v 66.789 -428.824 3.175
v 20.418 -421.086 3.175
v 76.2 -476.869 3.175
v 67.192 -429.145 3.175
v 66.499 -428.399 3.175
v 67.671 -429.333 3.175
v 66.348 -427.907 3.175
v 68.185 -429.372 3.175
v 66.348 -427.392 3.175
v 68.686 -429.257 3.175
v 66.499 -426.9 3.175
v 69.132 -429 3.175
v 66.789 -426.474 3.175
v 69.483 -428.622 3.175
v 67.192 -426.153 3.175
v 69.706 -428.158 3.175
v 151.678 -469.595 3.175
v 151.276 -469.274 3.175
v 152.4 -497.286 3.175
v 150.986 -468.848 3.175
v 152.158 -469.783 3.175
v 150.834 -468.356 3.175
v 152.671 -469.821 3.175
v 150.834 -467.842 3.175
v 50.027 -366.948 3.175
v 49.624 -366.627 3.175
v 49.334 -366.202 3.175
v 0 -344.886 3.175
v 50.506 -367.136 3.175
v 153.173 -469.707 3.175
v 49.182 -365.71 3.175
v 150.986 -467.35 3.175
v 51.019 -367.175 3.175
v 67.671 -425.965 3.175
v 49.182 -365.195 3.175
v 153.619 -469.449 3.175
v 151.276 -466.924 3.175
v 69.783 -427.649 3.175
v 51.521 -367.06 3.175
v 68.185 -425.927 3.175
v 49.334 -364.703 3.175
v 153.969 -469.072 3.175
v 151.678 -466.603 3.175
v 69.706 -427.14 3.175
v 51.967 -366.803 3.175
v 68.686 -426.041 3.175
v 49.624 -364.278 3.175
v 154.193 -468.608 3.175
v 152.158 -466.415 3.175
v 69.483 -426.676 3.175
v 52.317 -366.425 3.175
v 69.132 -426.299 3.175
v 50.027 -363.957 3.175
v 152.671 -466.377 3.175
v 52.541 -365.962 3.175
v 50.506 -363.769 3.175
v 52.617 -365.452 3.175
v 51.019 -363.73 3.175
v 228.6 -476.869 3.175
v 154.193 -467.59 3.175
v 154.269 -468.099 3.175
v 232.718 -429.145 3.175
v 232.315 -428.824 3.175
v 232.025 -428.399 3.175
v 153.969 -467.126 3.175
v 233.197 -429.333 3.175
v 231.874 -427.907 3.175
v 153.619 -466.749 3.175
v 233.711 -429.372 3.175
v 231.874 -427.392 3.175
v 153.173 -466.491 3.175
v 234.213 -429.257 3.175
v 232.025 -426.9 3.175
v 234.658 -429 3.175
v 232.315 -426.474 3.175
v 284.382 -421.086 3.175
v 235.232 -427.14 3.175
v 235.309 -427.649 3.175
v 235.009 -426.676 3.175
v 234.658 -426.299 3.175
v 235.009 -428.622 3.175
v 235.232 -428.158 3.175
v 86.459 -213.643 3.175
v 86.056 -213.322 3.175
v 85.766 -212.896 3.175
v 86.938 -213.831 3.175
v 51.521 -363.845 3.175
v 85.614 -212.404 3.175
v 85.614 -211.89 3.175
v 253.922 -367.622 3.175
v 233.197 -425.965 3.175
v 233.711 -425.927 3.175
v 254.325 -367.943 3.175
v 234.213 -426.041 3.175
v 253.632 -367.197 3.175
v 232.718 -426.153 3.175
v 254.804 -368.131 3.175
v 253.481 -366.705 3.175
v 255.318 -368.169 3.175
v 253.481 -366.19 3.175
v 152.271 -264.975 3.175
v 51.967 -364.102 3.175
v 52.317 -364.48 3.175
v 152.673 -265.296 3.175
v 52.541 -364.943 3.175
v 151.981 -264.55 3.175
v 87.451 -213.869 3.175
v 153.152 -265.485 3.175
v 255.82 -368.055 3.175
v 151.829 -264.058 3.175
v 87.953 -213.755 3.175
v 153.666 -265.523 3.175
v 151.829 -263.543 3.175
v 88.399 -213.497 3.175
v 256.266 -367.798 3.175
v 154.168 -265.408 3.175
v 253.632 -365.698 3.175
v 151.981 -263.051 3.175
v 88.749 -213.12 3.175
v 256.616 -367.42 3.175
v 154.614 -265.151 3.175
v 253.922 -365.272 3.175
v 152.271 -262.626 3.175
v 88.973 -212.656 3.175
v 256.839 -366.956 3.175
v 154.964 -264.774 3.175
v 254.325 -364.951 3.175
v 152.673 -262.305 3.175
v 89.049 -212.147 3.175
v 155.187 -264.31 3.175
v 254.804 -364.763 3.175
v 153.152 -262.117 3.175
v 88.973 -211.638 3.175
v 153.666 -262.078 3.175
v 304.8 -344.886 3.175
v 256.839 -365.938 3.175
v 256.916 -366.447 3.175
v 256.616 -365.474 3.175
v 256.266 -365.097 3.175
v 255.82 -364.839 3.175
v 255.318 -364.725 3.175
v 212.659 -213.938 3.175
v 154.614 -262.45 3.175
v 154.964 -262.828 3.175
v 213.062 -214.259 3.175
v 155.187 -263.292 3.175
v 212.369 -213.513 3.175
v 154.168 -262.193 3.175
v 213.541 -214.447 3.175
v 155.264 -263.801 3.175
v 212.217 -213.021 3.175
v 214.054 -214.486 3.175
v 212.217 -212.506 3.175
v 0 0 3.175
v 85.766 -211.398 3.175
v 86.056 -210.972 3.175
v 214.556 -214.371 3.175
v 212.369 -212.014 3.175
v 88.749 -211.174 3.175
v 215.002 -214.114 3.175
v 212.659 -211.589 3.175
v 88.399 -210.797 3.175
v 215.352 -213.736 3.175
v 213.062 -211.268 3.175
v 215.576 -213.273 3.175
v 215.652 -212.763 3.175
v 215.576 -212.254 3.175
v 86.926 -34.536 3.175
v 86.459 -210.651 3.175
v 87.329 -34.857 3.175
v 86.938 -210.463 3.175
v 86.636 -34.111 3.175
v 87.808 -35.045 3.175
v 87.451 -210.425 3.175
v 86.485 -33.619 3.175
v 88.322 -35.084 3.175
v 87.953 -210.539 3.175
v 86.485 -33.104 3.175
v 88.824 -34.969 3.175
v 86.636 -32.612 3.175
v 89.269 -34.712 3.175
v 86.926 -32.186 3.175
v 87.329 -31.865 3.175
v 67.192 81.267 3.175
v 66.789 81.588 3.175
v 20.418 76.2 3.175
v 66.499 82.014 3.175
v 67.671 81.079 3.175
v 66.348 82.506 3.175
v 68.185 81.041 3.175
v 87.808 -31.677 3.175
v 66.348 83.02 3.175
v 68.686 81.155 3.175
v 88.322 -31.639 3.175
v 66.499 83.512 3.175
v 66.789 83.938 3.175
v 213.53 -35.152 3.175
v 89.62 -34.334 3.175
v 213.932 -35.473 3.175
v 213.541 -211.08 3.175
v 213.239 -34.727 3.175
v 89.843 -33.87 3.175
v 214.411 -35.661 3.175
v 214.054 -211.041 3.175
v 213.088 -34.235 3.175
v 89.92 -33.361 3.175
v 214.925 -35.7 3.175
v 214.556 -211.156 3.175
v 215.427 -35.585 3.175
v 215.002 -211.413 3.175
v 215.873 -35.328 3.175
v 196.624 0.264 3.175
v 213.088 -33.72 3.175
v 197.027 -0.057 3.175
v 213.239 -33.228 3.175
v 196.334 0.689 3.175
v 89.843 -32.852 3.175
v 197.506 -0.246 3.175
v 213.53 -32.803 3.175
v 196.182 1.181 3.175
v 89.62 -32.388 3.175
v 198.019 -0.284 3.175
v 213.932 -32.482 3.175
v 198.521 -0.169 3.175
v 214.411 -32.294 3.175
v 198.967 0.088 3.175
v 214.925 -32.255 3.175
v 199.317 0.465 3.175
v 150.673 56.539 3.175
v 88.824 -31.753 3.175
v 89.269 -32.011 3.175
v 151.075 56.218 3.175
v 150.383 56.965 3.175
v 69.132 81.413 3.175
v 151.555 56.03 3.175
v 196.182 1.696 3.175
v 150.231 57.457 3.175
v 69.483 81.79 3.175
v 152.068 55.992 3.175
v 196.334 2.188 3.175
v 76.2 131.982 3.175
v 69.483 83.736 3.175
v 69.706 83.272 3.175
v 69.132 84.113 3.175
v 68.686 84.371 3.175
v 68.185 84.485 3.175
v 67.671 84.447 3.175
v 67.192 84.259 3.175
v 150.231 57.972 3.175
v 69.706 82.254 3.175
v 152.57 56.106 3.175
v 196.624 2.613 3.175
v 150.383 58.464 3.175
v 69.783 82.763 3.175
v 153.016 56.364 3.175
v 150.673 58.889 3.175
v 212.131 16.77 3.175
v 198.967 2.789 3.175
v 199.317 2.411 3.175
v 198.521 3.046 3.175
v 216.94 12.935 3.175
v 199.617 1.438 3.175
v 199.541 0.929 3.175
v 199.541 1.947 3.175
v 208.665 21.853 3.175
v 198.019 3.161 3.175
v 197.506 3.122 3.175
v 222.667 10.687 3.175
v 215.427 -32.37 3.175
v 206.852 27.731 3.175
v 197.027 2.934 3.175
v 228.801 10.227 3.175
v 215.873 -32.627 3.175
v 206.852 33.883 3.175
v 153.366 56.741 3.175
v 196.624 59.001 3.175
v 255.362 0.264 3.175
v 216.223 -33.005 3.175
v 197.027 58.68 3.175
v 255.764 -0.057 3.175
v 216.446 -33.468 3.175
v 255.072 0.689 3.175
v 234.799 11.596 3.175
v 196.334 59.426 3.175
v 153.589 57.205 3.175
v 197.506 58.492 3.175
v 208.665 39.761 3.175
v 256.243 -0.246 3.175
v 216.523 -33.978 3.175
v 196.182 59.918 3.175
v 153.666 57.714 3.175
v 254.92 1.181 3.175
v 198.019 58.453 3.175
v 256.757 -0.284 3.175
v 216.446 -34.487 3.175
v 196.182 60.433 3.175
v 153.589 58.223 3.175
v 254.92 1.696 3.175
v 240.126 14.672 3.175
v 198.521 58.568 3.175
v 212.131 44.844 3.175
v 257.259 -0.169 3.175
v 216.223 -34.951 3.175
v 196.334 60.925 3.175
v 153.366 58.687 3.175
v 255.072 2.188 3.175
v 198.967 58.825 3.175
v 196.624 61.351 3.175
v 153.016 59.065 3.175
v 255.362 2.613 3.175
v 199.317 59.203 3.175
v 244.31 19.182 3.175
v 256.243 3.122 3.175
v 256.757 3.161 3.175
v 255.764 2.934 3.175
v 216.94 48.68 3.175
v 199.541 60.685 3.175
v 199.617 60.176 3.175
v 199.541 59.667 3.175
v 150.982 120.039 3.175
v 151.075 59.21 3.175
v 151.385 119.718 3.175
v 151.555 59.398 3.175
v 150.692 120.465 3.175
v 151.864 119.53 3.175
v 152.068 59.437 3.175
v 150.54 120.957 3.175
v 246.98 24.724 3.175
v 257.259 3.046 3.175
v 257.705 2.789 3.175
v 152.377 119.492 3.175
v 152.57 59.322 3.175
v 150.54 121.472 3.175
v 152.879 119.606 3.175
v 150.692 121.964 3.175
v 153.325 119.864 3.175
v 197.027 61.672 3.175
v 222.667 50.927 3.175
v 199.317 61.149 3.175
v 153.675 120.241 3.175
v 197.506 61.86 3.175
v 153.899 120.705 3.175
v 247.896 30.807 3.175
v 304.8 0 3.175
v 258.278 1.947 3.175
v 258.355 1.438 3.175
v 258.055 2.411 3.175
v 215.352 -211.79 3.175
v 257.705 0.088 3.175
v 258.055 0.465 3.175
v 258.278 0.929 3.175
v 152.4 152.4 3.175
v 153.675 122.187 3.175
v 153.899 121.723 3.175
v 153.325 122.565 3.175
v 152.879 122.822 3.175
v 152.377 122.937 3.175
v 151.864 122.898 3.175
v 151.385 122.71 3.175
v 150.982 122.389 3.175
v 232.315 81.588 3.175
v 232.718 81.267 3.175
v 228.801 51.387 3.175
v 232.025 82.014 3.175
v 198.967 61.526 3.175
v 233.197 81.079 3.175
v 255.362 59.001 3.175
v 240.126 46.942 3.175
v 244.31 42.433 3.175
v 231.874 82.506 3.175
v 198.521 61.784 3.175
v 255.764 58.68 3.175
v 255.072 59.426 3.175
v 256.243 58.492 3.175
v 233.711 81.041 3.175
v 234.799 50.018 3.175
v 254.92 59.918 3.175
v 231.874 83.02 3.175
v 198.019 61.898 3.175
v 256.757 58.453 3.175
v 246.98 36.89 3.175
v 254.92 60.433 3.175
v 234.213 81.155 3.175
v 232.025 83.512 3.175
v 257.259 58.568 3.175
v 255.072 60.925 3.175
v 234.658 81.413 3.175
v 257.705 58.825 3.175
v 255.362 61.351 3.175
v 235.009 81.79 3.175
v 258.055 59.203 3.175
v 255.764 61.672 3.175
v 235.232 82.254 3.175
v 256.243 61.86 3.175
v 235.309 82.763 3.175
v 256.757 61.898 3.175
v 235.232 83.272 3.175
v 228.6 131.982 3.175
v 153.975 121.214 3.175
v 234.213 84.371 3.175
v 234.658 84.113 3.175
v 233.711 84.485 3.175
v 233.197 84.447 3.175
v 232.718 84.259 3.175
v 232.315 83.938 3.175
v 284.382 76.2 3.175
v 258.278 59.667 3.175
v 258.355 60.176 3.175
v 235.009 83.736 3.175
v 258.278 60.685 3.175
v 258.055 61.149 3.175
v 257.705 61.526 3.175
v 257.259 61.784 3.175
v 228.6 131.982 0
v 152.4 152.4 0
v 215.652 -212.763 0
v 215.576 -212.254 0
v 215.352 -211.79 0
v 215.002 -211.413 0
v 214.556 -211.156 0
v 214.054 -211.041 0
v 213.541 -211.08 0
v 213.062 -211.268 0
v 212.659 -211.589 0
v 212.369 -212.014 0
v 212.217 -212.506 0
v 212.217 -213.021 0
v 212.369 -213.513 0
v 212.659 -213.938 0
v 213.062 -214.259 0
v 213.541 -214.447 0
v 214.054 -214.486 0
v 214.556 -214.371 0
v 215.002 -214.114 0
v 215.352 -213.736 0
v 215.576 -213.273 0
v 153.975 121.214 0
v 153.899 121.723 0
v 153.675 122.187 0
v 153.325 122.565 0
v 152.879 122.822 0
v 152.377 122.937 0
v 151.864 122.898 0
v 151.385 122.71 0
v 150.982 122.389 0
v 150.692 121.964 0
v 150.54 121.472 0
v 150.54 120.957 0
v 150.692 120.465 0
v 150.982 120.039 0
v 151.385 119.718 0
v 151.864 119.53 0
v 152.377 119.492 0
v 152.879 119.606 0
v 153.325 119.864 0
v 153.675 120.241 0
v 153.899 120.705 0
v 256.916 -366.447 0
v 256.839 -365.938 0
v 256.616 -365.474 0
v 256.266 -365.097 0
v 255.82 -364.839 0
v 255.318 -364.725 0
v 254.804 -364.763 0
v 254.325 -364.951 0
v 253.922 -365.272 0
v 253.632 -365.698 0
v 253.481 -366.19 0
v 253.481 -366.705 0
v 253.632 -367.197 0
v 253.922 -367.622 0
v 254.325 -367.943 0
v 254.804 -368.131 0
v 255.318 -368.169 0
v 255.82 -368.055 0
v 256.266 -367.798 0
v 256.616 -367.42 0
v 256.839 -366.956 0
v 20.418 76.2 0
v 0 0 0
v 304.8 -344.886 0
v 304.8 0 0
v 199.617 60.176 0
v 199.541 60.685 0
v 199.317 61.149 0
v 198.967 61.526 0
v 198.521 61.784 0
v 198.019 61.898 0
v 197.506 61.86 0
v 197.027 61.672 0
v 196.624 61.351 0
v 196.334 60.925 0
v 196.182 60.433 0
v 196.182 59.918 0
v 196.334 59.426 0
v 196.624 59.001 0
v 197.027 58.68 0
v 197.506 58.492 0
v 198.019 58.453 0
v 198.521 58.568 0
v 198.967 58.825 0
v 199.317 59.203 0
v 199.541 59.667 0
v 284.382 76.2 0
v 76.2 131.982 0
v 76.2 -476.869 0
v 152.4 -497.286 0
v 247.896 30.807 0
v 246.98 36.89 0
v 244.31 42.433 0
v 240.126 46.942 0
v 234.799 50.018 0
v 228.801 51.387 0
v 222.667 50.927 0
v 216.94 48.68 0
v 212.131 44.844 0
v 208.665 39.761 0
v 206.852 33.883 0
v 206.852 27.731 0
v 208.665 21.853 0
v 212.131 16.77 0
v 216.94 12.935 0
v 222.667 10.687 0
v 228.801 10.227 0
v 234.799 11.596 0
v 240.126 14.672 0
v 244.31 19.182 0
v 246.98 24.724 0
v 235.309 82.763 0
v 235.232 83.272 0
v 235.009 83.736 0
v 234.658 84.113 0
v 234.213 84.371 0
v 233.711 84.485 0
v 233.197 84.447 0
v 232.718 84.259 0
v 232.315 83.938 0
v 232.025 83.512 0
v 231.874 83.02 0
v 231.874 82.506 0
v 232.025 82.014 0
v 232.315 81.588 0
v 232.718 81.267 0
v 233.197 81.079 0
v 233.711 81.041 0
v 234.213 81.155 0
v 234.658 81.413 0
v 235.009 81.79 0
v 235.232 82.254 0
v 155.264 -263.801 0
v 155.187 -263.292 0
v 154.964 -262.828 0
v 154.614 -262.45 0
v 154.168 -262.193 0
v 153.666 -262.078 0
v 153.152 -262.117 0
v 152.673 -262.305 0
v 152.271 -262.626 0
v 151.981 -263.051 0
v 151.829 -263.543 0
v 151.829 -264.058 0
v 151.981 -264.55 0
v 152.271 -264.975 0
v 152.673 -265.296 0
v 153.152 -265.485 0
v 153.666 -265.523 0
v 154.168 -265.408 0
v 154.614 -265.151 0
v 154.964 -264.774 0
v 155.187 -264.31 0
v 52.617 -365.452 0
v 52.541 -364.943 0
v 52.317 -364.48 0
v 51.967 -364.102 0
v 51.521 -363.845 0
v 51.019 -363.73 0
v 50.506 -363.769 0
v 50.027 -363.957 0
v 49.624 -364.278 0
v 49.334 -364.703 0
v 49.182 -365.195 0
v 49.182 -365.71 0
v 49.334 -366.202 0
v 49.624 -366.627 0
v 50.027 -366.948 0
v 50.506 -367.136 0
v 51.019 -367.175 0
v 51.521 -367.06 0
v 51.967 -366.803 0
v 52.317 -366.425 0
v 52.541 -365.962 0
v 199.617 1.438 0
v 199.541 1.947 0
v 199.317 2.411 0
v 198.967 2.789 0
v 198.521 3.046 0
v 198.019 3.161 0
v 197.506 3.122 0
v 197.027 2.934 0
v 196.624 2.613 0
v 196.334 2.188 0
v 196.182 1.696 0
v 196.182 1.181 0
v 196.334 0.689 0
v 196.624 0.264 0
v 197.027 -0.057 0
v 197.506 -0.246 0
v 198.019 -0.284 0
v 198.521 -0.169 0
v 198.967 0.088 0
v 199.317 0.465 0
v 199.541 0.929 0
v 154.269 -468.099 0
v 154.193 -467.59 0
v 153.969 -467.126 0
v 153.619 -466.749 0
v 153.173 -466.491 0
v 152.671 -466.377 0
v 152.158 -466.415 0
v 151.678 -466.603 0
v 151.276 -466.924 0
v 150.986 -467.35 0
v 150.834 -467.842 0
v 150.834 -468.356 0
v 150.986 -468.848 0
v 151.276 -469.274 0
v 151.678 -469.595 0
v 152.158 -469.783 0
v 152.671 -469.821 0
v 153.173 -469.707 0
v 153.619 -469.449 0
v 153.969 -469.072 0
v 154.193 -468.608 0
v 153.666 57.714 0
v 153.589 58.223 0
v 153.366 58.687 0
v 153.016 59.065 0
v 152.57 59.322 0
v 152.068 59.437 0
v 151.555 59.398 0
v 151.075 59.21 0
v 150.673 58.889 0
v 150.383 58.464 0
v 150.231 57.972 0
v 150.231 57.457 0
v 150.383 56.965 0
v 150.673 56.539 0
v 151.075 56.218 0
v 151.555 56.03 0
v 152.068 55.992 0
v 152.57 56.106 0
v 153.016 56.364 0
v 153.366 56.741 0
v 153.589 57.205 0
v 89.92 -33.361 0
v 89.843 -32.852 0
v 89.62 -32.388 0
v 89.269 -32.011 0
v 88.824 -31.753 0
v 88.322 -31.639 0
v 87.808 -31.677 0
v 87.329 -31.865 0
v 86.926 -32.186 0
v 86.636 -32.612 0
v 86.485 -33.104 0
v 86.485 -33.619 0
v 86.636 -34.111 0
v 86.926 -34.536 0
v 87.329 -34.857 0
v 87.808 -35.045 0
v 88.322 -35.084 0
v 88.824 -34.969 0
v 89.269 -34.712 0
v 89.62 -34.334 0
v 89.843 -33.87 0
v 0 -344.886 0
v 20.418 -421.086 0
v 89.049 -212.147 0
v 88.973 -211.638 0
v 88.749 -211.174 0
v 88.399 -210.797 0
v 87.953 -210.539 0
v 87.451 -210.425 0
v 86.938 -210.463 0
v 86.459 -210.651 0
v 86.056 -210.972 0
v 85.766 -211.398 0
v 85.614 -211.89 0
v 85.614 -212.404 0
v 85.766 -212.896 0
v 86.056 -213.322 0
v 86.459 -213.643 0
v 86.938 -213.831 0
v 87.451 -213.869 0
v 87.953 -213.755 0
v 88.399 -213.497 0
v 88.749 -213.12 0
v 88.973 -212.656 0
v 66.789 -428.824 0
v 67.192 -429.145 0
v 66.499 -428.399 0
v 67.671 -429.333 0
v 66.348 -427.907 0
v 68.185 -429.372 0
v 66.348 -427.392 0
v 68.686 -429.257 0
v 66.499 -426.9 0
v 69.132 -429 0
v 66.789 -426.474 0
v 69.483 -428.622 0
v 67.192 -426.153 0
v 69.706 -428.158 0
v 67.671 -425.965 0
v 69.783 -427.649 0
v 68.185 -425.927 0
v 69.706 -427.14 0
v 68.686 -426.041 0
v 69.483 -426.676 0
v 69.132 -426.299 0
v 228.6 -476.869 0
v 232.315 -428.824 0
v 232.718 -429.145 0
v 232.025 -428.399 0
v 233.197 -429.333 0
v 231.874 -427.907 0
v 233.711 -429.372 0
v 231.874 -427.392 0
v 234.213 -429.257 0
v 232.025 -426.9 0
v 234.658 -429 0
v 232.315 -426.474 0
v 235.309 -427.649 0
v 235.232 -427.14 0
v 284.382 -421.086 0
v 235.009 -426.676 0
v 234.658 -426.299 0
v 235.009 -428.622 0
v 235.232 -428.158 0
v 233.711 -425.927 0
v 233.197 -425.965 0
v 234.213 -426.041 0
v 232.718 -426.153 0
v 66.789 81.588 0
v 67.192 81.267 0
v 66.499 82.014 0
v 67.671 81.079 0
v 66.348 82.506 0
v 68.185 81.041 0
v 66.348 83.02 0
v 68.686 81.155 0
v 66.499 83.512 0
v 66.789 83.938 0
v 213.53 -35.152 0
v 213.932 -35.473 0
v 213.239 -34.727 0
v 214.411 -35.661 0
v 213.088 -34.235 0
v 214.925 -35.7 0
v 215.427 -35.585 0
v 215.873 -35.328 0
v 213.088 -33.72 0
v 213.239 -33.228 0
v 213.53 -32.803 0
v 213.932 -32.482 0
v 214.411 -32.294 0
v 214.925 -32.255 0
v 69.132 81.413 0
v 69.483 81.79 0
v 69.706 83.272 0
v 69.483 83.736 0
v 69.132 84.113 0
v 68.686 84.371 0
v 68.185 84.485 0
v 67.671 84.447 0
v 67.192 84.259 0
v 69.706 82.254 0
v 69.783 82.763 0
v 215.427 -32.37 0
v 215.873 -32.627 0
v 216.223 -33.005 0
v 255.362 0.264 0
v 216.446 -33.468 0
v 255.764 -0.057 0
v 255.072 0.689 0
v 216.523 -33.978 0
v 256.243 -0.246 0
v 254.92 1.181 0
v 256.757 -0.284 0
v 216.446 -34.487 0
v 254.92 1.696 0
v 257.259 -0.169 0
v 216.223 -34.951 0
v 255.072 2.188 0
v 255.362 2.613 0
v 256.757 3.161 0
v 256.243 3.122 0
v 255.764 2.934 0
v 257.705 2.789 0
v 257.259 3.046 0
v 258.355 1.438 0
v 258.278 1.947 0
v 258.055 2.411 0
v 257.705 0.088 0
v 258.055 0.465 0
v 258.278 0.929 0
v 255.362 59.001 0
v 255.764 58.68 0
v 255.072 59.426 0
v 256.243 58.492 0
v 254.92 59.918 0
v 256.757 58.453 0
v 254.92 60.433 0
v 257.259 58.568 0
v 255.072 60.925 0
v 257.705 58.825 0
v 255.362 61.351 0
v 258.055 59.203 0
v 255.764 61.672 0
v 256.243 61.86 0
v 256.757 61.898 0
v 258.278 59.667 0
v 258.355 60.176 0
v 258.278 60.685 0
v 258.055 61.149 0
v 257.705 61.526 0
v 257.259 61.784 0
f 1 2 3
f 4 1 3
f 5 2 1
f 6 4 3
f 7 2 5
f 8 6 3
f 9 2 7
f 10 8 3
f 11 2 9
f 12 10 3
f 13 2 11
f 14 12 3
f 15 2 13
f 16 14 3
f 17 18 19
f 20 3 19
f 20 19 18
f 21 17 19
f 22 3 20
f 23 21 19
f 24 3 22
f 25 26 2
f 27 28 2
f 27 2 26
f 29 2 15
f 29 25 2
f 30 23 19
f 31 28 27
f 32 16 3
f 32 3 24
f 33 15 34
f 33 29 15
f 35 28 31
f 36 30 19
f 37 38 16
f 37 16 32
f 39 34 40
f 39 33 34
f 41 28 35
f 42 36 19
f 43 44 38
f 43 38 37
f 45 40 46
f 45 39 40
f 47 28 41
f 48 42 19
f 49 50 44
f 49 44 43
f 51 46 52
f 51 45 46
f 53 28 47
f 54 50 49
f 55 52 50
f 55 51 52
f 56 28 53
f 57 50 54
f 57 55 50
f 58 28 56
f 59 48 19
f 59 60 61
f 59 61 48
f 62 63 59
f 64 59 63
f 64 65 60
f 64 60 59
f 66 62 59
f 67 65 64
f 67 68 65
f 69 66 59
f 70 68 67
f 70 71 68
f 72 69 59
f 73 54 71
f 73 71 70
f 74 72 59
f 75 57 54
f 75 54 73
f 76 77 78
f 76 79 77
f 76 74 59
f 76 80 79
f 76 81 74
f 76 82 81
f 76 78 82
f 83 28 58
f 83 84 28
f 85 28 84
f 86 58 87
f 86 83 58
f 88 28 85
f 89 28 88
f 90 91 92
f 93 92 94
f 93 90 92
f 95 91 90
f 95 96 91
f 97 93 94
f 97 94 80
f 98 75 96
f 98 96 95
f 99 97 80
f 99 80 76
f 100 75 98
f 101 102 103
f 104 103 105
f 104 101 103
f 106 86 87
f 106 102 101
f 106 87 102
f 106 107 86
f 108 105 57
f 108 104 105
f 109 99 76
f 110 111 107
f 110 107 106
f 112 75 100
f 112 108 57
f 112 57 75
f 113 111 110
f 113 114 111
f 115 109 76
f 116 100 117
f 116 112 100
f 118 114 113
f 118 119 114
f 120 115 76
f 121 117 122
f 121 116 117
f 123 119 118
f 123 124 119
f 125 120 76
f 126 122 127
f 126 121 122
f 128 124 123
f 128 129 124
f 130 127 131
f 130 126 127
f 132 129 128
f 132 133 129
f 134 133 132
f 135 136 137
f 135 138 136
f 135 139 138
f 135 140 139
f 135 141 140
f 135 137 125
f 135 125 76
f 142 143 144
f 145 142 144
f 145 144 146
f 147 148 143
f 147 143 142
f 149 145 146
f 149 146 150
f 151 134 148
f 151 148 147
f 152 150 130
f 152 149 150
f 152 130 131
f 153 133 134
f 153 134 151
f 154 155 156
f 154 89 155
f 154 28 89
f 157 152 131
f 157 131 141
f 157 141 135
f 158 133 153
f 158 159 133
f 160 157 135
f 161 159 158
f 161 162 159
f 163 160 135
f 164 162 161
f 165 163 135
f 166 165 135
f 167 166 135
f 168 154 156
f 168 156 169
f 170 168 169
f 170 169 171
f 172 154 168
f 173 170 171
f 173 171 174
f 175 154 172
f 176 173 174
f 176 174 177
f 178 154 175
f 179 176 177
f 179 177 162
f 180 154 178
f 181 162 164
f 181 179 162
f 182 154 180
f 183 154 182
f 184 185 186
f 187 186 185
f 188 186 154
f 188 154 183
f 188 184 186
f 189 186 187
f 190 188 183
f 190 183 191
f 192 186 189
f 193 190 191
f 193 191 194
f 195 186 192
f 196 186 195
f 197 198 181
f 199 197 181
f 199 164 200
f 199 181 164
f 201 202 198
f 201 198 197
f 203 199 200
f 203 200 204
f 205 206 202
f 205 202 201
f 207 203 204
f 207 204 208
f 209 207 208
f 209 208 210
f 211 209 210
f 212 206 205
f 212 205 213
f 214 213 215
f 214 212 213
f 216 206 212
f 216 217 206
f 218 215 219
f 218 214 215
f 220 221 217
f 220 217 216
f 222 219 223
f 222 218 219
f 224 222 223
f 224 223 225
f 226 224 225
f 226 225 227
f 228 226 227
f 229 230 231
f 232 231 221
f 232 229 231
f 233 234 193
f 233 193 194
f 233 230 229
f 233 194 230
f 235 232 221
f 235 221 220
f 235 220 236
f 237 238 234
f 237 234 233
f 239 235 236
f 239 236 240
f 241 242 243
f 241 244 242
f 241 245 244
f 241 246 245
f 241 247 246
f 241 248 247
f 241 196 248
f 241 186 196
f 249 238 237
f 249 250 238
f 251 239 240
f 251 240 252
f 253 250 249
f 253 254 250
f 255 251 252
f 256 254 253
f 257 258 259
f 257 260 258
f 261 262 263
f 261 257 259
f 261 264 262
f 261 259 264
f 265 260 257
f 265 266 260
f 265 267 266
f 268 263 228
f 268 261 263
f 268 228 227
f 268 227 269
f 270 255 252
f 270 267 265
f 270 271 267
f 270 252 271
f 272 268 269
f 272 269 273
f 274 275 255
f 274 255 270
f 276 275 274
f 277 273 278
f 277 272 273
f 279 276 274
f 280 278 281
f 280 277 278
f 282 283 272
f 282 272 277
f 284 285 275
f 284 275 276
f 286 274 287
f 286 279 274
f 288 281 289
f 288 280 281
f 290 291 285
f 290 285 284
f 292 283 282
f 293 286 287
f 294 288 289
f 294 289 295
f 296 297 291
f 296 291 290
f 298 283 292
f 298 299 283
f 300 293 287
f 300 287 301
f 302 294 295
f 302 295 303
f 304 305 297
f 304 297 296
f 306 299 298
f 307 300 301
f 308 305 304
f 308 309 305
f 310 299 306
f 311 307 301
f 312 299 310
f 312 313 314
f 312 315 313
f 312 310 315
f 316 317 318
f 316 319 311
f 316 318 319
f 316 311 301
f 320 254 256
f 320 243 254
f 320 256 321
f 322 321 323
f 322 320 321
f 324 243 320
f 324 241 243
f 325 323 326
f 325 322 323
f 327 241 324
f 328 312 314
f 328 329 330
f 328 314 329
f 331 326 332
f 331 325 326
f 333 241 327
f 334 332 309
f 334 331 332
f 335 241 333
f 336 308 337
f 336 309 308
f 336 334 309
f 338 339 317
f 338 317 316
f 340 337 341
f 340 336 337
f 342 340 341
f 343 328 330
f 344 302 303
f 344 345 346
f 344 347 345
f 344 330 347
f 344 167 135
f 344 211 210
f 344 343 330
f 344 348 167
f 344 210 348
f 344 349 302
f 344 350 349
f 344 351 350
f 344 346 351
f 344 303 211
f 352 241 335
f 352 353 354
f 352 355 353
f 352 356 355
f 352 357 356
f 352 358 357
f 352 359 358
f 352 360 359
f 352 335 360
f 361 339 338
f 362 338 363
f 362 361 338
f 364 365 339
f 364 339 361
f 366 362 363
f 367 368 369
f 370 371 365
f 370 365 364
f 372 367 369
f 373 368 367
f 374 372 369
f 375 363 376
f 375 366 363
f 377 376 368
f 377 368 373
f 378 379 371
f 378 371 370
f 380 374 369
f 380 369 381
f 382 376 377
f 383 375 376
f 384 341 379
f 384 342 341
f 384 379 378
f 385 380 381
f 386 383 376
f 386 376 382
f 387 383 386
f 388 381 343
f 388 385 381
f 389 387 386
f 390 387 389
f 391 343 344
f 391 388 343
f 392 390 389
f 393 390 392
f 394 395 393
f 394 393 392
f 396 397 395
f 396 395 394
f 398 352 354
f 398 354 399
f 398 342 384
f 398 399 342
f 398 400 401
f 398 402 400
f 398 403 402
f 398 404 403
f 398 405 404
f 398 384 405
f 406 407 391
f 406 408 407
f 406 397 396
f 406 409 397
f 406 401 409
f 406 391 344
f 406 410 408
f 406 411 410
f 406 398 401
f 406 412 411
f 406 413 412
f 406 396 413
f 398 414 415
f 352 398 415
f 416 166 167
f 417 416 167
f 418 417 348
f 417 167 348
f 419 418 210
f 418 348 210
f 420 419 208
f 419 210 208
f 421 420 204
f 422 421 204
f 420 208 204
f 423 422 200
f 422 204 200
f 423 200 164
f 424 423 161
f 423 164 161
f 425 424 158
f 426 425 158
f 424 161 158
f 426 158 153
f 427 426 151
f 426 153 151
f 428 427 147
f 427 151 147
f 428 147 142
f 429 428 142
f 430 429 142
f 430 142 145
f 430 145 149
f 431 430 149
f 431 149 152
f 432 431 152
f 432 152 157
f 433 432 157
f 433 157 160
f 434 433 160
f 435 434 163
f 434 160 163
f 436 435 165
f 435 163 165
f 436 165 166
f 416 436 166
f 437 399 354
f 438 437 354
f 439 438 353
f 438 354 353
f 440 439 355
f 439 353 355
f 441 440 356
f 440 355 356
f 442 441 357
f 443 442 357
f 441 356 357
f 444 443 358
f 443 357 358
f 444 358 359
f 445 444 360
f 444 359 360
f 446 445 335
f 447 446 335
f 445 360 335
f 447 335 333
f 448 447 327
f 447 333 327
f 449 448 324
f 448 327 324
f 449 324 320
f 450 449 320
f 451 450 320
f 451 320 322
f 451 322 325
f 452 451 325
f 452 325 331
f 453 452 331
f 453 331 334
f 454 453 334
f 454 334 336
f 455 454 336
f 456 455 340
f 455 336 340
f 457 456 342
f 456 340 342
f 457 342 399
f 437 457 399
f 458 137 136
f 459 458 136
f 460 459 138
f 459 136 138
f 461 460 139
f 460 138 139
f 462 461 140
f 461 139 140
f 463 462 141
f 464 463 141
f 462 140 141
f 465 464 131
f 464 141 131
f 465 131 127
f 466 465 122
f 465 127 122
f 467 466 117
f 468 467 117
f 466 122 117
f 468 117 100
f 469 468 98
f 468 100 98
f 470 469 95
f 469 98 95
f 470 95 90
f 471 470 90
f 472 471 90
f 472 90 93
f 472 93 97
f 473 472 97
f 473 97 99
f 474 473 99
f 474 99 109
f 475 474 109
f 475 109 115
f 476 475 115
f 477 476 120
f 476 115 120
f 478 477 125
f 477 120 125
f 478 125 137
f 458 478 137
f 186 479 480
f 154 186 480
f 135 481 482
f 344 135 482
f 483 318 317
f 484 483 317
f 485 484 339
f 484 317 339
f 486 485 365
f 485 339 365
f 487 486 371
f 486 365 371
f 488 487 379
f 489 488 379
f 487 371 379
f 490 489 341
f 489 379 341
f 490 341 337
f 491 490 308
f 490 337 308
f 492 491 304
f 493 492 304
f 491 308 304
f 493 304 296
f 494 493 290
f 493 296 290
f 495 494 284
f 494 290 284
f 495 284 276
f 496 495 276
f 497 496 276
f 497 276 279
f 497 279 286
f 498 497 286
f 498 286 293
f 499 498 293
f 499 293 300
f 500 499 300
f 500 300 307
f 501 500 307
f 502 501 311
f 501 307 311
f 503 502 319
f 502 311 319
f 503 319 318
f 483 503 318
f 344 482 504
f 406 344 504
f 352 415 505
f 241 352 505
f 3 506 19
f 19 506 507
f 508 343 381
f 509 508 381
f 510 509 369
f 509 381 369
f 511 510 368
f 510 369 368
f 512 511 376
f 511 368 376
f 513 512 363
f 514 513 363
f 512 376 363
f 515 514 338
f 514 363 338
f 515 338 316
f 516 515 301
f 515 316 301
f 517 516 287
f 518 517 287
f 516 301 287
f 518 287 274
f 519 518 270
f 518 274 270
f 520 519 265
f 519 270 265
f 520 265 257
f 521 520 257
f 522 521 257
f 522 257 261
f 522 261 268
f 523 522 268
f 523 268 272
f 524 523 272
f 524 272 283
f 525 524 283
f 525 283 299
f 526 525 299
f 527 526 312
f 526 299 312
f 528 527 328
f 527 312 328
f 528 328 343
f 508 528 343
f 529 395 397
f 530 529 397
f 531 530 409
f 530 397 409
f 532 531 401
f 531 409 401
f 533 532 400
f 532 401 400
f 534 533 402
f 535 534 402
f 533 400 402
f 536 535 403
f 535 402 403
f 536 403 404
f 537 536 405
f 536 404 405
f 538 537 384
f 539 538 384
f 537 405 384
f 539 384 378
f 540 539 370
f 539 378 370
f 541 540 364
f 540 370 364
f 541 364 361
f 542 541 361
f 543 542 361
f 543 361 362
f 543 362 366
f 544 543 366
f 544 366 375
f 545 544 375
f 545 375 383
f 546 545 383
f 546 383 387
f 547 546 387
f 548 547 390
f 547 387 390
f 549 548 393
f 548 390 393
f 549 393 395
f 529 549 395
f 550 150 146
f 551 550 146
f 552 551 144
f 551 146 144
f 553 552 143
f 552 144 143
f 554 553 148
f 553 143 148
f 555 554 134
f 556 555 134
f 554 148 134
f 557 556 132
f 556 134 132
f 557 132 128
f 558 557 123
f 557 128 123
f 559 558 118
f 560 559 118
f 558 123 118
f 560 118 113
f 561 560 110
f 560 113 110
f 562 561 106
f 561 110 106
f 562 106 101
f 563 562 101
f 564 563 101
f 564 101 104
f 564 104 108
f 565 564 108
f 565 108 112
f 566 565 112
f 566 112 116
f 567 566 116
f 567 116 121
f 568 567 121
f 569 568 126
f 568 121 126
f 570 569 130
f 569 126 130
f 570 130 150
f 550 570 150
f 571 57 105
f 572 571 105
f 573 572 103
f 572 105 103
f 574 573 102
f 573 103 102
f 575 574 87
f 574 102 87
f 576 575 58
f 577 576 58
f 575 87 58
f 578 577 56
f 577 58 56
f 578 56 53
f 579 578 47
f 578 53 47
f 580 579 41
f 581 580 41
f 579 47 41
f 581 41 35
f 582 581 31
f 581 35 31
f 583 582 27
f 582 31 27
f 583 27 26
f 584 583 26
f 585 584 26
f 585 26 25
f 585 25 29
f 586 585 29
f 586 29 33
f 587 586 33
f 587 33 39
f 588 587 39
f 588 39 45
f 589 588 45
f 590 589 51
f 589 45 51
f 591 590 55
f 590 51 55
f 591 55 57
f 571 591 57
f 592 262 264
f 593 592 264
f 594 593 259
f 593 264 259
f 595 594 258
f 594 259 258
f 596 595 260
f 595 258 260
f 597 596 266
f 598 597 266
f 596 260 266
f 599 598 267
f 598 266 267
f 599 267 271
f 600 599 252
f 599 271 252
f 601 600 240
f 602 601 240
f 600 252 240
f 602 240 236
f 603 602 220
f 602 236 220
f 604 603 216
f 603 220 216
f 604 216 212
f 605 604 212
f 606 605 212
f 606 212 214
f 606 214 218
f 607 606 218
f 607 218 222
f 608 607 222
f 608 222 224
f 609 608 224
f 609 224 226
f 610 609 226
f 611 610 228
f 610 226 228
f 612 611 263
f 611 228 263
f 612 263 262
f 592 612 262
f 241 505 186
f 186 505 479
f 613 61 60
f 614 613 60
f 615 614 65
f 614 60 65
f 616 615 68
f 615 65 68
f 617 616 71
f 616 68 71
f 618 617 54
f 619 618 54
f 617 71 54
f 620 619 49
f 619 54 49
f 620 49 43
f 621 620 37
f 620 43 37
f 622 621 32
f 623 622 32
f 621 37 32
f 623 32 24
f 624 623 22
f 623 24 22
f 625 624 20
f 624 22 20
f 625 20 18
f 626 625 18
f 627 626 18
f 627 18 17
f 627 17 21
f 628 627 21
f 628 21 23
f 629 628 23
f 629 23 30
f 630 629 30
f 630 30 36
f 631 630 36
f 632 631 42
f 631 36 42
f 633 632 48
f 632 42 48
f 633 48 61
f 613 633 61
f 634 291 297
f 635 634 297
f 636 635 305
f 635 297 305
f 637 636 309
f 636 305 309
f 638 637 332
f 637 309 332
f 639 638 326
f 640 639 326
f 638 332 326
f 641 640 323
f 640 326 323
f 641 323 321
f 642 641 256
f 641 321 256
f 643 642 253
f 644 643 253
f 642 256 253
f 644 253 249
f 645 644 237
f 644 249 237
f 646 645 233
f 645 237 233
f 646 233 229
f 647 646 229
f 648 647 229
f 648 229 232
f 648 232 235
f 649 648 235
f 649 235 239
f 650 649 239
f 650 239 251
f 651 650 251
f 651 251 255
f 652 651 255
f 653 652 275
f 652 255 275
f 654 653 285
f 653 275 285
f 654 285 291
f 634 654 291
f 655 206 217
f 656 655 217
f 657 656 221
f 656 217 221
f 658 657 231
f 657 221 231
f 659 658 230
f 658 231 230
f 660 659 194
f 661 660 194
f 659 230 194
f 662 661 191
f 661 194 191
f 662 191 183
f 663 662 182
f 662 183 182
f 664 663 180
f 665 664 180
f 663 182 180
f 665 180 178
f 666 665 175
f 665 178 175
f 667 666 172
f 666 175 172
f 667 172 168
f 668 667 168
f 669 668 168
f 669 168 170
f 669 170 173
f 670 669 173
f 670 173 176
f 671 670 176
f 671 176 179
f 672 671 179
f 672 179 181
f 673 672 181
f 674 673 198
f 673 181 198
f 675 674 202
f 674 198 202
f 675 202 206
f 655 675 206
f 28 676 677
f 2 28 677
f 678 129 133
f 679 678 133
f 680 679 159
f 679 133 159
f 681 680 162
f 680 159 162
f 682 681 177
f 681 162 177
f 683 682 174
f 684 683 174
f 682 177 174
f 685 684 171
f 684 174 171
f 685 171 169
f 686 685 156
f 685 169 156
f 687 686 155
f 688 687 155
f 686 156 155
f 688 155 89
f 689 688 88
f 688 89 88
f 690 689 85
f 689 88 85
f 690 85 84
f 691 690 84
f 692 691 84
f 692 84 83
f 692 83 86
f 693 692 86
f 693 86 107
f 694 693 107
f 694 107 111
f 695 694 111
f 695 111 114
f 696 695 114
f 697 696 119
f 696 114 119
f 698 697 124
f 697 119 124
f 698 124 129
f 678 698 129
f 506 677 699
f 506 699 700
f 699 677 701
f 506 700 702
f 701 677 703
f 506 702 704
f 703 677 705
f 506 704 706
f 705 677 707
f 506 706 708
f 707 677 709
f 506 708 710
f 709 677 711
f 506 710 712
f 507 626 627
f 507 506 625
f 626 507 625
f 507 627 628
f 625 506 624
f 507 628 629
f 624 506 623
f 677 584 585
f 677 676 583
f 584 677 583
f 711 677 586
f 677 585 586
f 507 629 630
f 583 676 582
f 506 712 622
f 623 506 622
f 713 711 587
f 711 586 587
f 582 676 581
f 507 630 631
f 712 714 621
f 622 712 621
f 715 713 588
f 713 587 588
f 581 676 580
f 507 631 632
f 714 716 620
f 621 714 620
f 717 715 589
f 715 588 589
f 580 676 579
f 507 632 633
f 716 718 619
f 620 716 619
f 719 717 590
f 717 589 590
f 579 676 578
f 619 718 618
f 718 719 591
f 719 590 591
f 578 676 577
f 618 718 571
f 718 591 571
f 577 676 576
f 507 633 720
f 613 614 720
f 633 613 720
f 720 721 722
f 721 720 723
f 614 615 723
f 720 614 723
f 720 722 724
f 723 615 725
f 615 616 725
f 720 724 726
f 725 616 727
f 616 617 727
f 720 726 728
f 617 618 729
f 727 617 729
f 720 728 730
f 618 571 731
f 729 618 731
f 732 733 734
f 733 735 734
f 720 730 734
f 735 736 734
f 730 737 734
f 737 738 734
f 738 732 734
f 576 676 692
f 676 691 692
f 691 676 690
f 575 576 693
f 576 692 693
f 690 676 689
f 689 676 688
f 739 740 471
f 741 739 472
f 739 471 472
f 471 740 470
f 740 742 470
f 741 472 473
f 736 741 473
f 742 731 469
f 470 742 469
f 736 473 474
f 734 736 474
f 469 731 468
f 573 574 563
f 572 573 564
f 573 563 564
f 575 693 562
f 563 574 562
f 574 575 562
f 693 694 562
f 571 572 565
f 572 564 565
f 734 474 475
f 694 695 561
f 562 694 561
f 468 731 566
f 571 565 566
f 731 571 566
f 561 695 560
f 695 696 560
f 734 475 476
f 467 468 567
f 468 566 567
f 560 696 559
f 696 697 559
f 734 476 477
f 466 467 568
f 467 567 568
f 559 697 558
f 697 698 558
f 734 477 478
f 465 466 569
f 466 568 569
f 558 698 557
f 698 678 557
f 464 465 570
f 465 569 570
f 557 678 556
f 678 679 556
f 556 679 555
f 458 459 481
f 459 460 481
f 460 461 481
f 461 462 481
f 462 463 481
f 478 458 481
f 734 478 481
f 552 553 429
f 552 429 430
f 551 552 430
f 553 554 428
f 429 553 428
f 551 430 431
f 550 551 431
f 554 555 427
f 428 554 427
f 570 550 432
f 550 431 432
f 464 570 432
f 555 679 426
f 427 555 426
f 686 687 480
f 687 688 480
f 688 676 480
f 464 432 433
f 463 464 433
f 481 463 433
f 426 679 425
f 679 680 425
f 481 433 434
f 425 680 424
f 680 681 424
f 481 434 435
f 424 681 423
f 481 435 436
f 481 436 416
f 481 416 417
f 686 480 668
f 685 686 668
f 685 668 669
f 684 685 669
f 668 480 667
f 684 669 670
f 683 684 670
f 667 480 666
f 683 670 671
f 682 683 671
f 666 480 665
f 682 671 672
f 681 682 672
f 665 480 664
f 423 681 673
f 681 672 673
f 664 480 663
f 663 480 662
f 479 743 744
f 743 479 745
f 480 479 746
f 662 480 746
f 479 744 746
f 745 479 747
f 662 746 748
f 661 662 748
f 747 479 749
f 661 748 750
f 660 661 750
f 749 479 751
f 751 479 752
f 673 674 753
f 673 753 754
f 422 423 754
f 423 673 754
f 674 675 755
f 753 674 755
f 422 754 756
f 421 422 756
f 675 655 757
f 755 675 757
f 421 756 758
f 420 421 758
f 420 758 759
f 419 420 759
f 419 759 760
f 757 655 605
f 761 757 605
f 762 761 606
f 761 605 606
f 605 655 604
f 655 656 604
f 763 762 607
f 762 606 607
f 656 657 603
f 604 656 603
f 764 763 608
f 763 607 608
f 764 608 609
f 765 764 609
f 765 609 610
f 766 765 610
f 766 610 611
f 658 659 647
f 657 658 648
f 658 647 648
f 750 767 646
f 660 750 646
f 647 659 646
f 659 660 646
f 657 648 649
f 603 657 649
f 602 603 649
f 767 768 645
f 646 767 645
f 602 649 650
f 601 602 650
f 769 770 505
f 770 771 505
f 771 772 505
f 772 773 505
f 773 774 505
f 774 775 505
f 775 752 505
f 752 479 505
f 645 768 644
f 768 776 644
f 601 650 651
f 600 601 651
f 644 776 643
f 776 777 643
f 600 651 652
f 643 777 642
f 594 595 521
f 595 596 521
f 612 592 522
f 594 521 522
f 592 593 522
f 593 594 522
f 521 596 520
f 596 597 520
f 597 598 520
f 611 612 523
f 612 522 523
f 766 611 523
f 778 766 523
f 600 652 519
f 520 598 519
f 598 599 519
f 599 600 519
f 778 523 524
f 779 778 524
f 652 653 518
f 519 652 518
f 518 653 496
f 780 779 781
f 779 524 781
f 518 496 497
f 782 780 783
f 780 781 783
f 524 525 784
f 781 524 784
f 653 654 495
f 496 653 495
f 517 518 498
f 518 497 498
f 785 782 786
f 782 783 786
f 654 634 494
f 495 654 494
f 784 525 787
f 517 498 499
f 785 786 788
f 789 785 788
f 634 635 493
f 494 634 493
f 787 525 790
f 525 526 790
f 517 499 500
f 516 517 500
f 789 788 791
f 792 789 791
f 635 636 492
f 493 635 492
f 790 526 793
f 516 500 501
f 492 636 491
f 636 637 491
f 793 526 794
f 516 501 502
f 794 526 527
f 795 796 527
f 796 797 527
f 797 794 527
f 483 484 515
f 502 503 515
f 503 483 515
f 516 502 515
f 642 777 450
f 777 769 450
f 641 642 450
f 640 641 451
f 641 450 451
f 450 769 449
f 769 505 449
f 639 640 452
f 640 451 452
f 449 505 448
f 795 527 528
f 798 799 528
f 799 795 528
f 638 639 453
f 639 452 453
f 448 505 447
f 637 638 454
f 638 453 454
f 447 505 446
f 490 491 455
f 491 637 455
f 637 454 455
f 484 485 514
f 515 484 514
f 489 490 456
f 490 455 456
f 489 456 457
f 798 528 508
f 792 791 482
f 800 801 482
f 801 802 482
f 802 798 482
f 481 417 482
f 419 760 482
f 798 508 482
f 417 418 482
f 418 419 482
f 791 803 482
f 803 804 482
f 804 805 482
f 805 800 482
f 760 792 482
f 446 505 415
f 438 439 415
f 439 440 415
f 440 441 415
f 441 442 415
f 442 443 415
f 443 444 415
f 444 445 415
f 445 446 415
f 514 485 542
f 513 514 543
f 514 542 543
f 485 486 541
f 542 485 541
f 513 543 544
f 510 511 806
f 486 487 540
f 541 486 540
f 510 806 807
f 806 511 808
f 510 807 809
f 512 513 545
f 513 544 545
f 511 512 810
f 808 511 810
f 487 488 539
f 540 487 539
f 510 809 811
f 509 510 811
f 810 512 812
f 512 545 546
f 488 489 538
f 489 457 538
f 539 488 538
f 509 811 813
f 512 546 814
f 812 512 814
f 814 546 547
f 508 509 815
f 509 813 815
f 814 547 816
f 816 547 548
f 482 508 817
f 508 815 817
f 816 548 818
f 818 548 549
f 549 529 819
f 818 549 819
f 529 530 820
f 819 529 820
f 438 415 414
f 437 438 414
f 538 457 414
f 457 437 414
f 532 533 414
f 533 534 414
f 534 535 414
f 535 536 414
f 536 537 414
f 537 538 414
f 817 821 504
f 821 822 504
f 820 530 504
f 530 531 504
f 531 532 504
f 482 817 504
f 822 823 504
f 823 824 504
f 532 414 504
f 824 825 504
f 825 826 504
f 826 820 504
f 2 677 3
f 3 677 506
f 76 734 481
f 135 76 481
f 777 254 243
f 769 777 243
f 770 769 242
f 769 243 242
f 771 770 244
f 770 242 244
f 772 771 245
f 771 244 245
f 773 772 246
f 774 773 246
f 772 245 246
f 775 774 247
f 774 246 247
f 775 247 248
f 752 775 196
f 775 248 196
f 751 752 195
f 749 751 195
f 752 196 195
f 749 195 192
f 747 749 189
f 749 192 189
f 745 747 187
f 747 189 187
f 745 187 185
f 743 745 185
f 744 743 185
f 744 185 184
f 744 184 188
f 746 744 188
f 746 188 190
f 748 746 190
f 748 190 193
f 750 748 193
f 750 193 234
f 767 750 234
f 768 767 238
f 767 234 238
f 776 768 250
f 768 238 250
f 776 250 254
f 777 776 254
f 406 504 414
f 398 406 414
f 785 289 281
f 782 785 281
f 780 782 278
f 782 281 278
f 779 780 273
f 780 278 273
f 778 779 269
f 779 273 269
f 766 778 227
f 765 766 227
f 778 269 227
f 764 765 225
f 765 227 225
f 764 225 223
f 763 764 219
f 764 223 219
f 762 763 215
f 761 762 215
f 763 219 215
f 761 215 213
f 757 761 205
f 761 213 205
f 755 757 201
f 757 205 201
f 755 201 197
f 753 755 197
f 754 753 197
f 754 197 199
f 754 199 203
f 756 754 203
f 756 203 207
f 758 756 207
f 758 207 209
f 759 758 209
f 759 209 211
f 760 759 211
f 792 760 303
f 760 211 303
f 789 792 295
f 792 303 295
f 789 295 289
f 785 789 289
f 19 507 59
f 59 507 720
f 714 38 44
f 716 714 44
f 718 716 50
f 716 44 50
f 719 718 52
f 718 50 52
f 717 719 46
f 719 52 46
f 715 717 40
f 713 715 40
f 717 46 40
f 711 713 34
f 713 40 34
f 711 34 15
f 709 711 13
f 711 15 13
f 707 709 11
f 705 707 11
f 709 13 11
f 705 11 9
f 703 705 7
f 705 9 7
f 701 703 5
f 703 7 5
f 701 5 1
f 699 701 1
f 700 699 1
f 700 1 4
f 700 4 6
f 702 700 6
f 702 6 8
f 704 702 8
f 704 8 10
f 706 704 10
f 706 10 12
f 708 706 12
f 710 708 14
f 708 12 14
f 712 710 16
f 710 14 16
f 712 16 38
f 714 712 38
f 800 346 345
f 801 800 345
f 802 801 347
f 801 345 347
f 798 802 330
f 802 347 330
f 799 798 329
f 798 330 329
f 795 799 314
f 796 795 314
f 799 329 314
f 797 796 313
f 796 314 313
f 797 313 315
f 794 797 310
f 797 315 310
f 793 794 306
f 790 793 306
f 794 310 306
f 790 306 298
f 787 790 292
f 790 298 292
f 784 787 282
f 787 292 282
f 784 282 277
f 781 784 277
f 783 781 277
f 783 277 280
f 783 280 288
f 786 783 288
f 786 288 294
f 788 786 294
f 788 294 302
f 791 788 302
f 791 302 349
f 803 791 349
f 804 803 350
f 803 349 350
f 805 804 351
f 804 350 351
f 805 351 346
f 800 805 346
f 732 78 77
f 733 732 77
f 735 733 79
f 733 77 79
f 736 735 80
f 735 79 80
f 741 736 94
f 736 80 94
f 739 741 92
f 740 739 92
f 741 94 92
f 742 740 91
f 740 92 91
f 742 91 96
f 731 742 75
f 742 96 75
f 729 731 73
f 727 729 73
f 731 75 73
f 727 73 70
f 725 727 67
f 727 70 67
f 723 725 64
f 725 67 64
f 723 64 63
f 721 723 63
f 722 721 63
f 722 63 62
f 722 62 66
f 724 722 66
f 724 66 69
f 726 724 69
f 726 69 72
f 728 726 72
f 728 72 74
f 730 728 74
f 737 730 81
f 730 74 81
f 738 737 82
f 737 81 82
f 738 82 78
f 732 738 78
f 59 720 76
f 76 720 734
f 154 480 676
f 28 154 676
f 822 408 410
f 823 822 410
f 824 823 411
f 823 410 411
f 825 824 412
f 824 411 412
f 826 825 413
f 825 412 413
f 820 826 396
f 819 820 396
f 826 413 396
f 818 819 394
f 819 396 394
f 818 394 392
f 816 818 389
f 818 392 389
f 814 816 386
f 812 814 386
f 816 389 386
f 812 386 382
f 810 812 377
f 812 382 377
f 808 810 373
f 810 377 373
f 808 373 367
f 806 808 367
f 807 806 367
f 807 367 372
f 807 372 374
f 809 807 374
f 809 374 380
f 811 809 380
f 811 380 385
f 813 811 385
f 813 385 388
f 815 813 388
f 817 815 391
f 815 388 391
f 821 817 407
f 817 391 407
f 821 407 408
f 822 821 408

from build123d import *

# Parameters (mm, degrees)
F1_DEPTH = 3.175
F2_R     = 20.6375
F2_R_2   = 1.7272
F3_DEPTH = 3.175


with BuildPart() as f1:
    # F0 (on Top) → F1 (new body)
    with BuildSketch(Plane.XY):
        Polygon((304.8, -344.886255), (304.8, 0), (284.382272, 76.2), (228.6, 131.982272), (152.4, 152.4), (76.2, 131.982272), (20.417728, 76.2), (0, 0), (0, -344.886255), (20.417728, -421.086255), (76.2, -476.868526), (152.4, -497.286255), (228.6, -476.868526), (284.382272, -421.086255), align=None)
    extrude(amount=F1_DEPTH)

    # F2 (on face) → F3 (cut, through all)
    with BuildSketch(Plane.XY.offset(3.175)):
        with Locations((227.258907, 30.807116)):
            Circle(F2_R)
        with Locations((88.192595, -33.361206)):
            Circle(F2_R_2)
        with Locations((214.795642, -33.977575)):
            Circle(F2_R_2)
        with Locations((197.890157, 1.438366)):
            Circle(F2_R_2)
        with Locations((256.627657, 1.438366)):
            Circle(F2_R_2)
        with Locations((256.627657, 60.175866)):
            Circle(F2_R_2)
        with Locations((197.890157, 60.175866)):
            Circle(F2_R_2)
        with Locations((213.92522, -212.763443)):
            Circle(F2_R_2)
        with Locations((87.322173, -212.147074)):
            Circle(F2_R_2)
        with Locations((152.542099, -468.099017)):
            Circle(F2_R_2)
        with Locations((255.188616, -366.447129)):
            Circle(F2_R_2)
        with Locations((153.536729, -263.800611)):
            Circle(F2_R_2)
        with Locations((50.890211, -365.452499)):
            Circle(F2_R_2)
        with Locations((152.248171, 121.214165)):
            Circle(F2_R_2)
        with Locations((151.93902, 57.714165)):
            Circle(F2_R_2)
        with Locations((68.055466, 82.76303)):
            Circle(F2_R_2)
        with Locations((233.581526, 82.76303)):
            Circle(F2_R_2)
        with Locations((68.055466, -427.649284)):
            Circle(F2_R_2)
        with Locations((233.581526, -427.649284)):
            Circle(F2_R_2)
    extrude(amount=-F3_DEPTH, mode=Mode.SUBTRACT)


solid = f1.part
